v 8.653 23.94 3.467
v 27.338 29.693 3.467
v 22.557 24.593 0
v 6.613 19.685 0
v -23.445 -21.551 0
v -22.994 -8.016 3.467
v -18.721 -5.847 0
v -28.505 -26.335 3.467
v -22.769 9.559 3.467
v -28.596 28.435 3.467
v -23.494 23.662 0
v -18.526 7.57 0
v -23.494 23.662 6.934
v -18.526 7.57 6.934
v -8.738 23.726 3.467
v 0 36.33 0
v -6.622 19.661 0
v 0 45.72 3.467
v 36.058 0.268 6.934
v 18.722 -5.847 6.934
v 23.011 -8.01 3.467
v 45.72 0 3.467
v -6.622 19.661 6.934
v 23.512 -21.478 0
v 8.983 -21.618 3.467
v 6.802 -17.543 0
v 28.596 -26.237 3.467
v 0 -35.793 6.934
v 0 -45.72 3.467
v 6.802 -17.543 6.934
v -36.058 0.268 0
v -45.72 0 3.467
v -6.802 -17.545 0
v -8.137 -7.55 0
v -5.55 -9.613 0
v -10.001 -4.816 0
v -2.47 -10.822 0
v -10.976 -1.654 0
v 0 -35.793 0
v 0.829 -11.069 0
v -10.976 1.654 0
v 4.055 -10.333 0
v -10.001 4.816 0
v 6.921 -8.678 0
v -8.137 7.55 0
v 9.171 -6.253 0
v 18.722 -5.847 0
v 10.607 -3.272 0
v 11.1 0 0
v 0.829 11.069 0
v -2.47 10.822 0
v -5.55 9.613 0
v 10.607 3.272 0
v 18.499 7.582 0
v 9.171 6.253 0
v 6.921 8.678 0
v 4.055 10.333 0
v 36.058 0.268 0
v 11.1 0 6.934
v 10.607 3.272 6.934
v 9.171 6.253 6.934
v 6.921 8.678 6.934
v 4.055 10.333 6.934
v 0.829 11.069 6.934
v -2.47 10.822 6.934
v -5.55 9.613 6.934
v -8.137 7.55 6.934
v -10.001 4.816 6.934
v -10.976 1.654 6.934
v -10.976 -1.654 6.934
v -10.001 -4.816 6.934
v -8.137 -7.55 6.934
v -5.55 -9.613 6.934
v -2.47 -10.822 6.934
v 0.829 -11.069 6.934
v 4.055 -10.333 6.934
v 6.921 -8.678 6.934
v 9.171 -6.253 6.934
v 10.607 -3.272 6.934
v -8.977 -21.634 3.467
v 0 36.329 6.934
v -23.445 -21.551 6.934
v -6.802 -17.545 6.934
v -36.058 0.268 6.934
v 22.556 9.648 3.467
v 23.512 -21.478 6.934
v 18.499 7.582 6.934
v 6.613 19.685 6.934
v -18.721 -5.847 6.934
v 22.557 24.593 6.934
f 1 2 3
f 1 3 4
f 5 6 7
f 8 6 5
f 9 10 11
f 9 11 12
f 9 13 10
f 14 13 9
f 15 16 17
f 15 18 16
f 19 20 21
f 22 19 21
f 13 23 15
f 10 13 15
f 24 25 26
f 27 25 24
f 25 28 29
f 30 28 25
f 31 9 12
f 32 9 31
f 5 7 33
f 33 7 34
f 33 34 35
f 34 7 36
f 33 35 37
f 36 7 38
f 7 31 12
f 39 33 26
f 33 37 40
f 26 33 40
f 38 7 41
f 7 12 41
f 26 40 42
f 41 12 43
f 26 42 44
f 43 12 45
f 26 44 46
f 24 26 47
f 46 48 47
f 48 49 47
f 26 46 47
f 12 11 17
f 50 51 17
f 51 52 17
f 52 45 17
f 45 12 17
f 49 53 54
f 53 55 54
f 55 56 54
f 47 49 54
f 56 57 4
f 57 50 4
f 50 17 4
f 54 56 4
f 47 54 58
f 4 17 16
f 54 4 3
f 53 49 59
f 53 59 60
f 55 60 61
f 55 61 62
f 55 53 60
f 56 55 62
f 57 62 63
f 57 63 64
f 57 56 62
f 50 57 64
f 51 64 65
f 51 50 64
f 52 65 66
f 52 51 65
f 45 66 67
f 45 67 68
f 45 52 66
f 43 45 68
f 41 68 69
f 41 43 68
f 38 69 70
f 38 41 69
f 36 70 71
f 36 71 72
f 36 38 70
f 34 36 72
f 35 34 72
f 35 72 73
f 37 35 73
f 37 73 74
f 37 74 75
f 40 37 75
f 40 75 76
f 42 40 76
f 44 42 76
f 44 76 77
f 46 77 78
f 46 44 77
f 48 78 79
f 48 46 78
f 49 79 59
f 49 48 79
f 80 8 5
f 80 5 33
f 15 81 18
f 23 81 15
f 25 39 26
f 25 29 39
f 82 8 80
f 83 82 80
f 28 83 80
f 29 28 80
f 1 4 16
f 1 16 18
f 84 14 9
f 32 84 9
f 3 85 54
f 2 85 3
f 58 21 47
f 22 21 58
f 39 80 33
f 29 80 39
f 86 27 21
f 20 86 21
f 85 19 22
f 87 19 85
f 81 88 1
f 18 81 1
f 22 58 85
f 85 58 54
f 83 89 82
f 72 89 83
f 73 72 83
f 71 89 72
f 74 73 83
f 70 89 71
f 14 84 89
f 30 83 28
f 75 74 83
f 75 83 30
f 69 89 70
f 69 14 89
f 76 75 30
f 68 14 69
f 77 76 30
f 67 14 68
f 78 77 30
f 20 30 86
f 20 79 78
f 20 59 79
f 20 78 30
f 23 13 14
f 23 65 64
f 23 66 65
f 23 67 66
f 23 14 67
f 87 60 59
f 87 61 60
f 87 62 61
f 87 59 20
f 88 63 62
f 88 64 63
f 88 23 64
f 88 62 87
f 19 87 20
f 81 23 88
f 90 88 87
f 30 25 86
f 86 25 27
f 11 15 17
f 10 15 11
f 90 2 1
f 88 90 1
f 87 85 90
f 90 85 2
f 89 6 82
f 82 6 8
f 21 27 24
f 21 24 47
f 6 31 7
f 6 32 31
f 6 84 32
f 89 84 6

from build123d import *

# Parameters (mm, degrees)
F0_R     = 11.0998
F1_DEPTH = 6.9342
F2_SIZE  = 3.4671
F3_SIZE  = 3.46709
F5_DEPTH = 6.9342
F6_SIZE  = 3.46709


# Not quite as in the source:
# - a fillet or chamfer is up to 0.001 mm smaller than in the source, because OpenCascade refuses the exact size


with BuildPart() as f1:
    # F0 (on Top) → F1 (new body)
    with BuildSketch(Plane.XY):
        Polygon((12.7, 13.7528510513), (0, 45.72), (-12.7, 13.7528510513), (-45.72, 0), (-12.7, -11.6471489487), (0, -45.72), (12.7, -11.6471489487), (45.72, 0), align=None)
        Circle(F0_R, mode=Mode.SUBTRACT)
    extrude(amount=F1_DEPTH)

    # F2
    f2_edges = [f1.edges().sort_by_distance(p)[0] for p in [
        (6.35, -28.683574, 6.9342),
        (29.21, -5.823574, 6.9342),
        (-29.21, -5.823574, 6.9342),
        (-6.35, 29.736426, 6.9342),
        (-29.21, 6.876426, 6.9342),
        (6.35, 29.736426, 6.9342),
        (29.21, 6.876426, 6.9342),
        (-6.35, -28.683574, 6.9342),
    ]]
    chamfer(f2_edges, length=F2_SIZE)

    # F3 (size 3.4671 in the source; OpenCascade refuses exactly that, so slightly less here)
    f3_edges = [f1.edges().sort_by_distance(p)[0] for p in [
        (6.35, -28.683574, 0),
        (29.21, -5.823574, 0),
        (-29.21, -5.823574, 0),
        (-6.35, -28.683574, 0),
        (6.35, 29.736426, 0),
        (29.21, 6.876426, 0),
        (-29.21, 6.876426, 0),
        (-6.35, 29.736426, 0),
    ]]
    chamfer(f3_edges, length=F3_SIZE)

    # F4 (on face) → F5 (join)
    with BuildSketch(Plane.XY.offset(6.9342)):
        Polygon((-5.3285628953, 22.9169632653), (-28.5960960526, 28.4347391196), (-10.0175652565, 11.1142831944), align=None)
        Polygon((-28.5960960526, 28.4347391196), (-21.7413331227, 6.2313264038), (-10.0175652565, 11.1142831944), align=None)
        Polygon((27.3380211817, 29.6928139905), (5.3285628953, 22.9169632653), (10.0175652565, 11.1142831944), align=None)
        Polygon((27.3380211817, 29.6928139905), (10.0175652565, 11.1142831944), (21.7413331227, 6.2313264038), align=None)
        Polygon((10.0175516395, -8.916864886), (5.5819678365, -20.8171000234), (28.5960824356, -26.2373208112), align=None)
        Polygon((-5.5819678365, -20.8171000234), (-10.0175516395, -8.916864886), (-28.504862756, -26.3346525665), align=None)
        Polygon((-10.0175516395, -8.916864886), (-21.9943219535, -4.6922971158), (-28.504862756, -26.3346525665), align=None)
        Polygon((21.9943219535, -4.6922971158), (10.0175516395, -8.916864886), (28.5960824356, -26.2373208112), align=None)
    extrude(amount=-F5_DEPTH)

    # F6 (size 3.4671 in the source; OpenCascade refuses exactly that, so slightly less here)
    f6_edges = [f1.edges().sort_by_distance(p)[0] for p in [
        (17.089025, -23.52721, 6.9342),
        (25.295202, -15.464809, 6.9342),
        (24.539677, 17.96207, 6.9342),
        (-17.043415, -23.575876, 6.9342),
        (-25.249592, -15.513475, 6.9342),
        (-25.168715, 17.333033, 6.9342),
        (-16.962329, 25.675851, 6.9342),
        (16.333292, 26.304889, 6.9342),
        (24.539678, 17.962075, 0),
        (25.295204, -15.464814, 0),
        (17.08903, -23.527212, 0),
        (-17.04342, -23.575877, 0),
        (16.333297, 26.30489, 0),
        (-16.962334, 25.675852, 0),
        (-25.168716, 17.333038, 0),
        (-25.249594, -15.51348, 0),
    ]]
    chamfer(f6_edges, length=F6_SIZE)


solid = f1.part
